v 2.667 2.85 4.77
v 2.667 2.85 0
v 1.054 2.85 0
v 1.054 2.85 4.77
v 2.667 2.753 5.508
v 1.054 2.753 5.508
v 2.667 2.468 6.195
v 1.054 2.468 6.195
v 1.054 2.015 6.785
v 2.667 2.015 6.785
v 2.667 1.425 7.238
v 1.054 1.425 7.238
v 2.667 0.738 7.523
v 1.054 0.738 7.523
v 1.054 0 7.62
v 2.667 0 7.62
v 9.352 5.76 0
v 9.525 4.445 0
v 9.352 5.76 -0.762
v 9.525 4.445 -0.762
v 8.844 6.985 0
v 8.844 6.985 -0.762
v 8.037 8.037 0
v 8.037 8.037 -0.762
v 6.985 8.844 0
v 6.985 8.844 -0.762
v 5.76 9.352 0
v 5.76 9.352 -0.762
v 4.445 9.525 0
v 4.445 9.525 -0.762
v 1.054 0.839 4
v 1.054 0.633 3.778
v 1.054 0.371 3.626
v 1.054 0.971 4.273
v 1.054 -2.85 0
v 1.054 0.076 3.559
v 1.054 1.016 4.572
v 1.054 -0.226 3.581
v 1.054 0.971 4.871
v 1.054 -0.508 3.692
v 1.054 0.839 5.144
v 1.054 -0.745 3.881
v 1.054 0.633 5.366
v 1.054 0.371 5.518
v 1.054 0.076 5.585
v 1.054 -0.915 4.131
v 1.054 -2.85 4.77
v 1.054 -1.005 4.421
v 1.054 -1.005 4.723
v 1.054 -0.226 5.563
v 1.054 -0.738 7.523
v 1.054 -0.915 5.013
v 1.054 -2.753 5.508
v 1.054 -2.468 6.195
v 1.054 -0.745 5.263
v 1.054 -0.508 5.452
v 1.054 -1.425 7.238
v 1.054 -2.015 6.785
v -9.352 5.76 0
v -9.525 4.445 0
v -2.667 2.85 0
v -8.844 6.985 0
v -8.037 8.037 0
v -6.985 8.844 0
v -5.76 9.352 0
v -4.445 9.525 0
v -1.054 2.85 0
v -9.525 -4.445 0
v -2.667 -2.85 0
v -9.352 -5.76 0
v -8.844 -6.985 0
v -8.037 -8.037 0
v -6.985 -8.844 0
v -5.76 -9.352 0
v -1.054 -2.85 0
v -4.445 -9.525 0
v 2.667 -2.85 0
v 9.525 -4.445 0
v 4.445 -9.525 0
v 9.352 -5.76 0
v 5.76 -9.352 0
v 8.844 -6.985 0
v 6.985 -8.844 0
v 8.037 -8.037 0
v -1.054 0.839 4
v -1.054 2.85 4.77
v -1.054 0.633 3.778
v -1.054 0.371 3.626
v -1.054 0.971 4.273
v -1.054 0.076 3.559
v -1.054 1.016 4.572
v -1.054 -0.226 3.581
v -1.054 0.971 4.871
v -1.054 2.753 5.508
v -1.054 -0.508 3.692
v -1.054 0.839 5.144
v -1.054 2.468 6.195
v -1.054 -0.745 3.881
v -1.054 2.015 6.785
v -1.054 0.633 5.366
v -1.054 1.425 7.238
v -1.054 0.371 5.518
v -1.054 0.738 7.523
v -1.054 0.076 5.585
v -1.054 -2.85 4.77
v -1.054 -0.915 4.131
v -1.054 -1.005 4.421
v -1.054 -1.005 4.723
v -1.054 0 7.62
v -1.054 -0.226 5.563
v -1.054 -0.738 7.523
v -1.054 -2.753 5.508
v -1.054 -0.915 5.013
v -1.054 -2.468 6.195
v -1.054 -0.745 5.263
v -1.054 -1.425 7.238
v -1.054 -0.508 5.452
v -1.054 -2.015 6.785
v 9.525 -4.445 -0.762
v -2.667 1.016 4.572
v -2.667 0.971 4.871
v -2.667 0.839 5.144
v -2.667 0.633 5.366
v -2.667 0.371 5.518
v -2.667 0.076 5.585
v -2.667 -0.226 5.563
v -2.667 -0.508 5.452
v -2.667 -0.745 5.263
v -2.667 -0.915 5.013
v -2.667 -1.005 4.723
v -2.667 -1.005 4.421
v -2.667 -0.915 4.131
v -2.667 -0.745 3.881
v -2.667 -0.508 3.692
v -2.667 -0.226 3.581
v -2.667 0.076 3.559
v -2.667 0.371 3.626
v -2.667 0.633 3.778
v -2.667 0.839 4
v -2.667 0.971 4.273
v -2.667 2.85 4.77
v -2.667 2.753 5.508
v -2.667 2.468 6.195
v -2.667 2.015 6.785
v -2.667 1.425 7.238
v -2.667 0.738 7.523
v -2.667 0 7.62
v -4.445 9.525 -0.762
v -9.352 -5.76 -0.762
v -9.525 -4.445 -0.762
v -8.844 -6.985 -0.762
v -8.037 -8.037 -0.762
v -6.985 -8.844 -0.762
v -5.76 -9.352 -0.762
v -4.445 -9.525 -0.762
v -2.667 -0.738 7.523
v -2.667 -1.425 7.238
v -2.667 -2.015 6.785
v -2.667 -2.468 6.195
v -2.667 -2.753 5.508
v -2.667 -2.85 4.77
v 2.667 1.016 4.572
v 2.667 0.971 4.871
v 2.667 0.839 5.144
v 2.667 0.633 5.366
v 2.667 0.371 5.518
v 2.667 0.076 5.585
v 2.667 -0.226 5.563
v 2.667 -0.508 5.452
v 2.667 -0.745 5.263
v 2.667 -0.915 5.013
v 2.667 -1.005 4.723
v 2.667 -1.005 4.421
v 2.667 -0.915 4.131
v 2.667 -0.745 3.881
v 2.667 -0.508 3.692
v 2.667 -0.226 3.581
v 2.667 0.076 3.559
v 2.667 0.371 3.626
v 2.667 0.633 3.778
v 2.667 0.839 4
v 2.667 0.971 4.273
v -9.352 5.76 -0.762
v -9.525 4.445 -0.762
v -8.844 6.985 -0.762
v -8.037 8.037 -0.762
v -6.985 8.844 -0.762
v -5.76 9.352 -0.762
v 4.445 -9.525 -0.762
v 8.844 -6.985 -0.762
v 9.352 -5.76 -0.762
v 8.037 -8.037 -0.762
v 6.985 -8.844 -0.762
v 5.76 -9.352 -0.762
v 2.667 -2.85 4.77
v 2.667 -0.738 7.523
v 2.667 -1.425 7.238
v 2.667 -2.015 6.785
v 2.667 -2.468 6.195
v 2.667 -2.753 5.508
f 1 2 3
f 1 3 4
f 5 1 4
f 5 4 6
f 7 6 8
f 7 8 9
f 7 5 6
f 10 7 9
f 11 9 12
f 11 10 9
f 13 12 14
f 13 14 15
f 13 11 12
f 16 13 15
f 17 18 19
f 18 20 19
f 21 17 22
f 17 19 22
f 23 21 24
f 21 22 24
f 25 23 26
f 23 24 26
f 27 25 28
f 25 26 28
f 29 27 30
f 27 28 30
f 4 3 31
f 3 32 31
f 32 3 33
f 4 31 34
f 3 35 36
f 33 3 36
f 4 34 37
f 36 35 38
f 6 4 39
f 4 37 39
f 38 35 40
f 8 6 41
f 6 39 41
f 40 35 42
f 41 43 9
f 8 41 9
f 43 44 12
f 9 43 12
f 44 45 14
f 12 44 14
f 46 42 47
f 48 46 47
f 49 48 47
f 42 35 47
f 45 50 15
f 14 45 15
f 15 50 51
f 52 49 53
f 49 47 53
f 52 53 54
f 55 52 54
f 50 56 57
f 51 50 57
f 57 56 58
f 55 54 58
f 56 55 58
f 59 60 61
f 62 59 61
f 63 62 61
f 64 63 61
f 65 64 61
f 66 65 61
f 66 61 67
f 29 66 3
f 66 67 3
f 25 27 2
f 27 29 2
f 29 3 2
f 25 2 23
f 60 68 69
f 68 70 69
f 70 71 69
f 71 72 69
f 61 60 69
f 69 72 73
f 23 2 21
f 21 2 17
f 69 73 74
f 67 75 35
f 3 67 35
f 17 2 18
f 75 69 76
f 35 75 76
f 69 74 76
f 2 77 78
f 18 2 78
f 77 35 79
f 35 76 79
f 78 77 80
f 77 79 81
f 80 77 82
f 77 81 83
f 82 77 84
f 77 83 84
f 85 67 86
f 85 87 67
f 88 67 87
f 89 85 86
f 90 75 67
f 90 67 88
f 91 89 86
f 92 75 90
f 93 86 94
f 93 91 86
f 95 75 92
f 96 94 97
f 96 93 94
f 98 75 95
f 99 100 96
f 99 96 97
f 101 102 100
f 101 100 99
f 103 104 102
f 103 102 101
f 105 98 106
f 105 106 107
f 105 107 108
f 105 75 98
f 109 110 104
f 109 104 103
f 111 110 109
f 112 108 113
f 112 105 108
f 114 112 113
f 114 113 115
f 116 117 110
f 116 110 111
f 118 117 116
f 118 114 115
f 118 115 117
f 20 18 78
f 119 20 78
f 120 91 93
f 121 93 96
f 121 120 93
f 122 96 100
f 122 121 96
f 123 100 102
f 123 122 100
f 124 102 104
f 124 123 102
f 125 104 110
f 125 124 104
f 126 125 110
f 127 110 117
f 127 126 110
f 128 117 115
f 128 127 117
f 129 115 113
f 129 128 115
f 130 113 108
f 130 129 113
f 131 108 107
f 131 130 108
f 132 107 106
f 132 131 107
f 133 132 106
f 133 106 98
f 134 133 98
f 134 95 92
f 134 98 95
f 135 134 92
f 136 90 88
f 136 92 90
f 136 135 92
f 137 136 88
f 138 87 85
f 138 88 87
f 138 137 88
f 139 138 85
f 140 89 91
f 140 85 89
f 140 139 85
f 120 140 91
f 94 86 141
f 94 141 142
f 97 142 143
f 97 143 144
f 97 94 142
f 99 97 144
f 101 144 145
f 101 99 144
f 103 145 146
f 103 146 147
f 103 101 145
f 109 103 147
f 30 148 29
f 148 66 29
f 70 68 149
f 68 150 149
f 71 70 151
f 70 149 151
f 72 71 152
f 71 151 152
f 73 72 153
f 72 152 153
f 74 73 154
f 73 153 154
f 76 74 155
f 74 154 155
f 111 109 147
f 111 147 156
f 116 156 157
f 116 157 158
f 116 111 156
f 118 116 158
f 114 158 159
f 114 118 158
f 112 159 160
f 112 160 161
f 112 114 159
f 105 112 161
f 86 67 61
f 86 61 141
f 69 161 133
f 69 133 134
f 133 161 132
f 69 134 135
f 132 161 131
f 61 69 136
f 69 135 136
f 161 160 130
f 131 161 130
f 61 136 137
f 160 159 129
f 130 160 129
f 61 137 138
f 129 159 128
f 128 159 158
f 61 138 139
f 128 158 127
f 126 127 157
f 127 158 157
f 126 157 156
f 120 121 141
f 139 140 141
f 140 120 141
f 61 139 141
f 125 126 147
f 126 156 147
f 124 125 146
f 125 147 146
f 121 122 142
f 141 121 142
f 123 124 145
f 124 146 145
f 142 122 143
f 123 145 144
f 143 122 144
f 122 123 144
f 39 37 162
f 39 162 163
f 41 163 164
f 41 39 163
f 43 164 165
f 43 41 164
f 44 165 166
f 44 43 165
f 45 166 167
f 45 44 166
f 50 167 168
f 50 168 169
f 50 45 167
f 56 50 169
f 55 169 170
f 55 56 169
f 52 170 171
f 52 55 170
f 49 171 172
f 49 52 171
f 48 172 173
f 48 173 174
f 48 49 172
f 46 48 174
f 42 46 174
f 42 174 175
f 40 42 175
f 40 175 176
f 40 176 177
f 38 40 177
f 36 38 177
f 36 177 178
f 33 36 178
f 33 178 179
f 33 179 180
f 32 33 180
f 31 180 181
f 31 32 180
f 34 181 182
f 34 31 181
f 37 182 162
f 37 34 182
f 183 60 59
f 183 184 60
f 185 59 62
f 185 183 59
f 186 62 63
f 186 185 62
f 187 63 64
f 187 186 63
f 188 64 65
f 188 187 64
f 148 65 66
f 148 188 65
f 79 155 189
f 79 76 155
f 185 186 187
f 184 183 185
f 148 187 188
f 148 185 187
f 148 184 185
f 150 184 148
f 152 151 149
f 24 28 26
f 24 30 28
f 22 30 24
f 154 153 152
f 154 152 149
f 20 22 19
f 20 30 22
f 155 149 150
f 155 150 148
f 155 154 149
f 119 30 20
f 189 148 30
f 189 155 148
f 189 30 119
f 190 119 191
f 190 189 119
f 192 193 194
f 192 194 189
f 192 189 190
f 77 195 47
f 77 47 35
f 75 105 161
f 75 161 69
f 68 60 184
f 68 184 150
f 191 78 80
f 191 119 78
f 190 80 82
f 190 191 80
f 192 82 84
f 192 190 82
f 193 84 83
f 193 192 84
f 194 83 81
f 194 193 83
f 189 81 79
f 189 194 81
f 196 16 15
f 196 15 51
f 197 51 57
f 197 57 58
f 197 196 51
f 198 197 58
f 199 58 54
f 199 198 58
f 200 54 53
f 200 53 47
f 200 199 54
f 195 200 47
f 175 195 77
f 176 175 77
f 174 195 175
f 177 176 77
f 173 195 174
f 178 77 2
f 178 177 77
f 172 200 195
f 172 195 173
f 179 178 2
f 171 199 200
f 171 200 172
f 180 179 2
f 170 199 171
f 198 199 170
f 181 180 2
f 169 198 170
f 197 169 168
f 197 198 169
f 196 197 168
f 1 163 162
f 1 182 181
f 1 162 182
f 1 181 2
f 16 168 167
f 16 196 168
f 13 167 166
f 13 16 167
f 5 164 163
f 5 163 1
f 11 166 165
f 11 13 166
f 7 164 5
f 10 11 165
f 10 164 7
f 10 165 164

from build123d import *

# Parameters (mm, degrees)
F0_R     = 1.016
F1_DEPTH = 2.667
F2_W     = 19.05
F2_H     = 19.05
F3_DEPTH = 0.762
F4_W     = 2.1082
F4_H     = 12.7
F5_DEPTH = 12.7
F6_R     = 5.08


with BuildPart() as f1:
    # F0 (on Right) → F1 (new body, symmetric)
    with BuildSketch(Plane.YZ):
        with BuildLine():
            Line((-2.85, 4.77), (-2.85, 0))
            Line((-2.85, 0), (2.85, 0))
            Line((2.85, 0), (2.85, 4.77))
            ThreePointArc((2.85, 4.77), (2.015254, 6.785254), (0, 7.62))
            ThreePointArc((0, 7.62), (-2.015254, 6.785254), (-2.85, 4.77))
        make_face()
        with Locations((0, 4.572)):
            Circle(F0_R, mode=Mode.SUBTRACT)
    extrude(amount=F1_DEPTH, both=True)

    # F2 (on face) → F3 (join)
    with BuildSketch(Plane(origin=(0, 0, 0), x_dir=(1, 0, 0), z_dir=(0, 0, -1))):
        Rectangle(F2_W, F2_H)
    extrude(amount=F3_DEPTH)

    # F4 (on Front) → F5 (cut, symmetric)
    with BuildSketch(Plane.XZ):
        with Locations((0, 6.35)):
            Rectangle(F4_W, F4_H)
    extrude(amount=F5_DEPTH, both=True, mode=Mode.SUBTRACT)

    # F6
    f6_edges = [f1.edges().sort_by_distance(p)[0] for p in [
        (9.525, 9.525, -0.381),
        (-9.525, 9.525, -0.381),
        (9.525, -9.525, -0.381),
        (-9.525, -9.525, -0.381),
    ]]
    fillet(f6_edges, radius=F6_R)


solid = f1.part
